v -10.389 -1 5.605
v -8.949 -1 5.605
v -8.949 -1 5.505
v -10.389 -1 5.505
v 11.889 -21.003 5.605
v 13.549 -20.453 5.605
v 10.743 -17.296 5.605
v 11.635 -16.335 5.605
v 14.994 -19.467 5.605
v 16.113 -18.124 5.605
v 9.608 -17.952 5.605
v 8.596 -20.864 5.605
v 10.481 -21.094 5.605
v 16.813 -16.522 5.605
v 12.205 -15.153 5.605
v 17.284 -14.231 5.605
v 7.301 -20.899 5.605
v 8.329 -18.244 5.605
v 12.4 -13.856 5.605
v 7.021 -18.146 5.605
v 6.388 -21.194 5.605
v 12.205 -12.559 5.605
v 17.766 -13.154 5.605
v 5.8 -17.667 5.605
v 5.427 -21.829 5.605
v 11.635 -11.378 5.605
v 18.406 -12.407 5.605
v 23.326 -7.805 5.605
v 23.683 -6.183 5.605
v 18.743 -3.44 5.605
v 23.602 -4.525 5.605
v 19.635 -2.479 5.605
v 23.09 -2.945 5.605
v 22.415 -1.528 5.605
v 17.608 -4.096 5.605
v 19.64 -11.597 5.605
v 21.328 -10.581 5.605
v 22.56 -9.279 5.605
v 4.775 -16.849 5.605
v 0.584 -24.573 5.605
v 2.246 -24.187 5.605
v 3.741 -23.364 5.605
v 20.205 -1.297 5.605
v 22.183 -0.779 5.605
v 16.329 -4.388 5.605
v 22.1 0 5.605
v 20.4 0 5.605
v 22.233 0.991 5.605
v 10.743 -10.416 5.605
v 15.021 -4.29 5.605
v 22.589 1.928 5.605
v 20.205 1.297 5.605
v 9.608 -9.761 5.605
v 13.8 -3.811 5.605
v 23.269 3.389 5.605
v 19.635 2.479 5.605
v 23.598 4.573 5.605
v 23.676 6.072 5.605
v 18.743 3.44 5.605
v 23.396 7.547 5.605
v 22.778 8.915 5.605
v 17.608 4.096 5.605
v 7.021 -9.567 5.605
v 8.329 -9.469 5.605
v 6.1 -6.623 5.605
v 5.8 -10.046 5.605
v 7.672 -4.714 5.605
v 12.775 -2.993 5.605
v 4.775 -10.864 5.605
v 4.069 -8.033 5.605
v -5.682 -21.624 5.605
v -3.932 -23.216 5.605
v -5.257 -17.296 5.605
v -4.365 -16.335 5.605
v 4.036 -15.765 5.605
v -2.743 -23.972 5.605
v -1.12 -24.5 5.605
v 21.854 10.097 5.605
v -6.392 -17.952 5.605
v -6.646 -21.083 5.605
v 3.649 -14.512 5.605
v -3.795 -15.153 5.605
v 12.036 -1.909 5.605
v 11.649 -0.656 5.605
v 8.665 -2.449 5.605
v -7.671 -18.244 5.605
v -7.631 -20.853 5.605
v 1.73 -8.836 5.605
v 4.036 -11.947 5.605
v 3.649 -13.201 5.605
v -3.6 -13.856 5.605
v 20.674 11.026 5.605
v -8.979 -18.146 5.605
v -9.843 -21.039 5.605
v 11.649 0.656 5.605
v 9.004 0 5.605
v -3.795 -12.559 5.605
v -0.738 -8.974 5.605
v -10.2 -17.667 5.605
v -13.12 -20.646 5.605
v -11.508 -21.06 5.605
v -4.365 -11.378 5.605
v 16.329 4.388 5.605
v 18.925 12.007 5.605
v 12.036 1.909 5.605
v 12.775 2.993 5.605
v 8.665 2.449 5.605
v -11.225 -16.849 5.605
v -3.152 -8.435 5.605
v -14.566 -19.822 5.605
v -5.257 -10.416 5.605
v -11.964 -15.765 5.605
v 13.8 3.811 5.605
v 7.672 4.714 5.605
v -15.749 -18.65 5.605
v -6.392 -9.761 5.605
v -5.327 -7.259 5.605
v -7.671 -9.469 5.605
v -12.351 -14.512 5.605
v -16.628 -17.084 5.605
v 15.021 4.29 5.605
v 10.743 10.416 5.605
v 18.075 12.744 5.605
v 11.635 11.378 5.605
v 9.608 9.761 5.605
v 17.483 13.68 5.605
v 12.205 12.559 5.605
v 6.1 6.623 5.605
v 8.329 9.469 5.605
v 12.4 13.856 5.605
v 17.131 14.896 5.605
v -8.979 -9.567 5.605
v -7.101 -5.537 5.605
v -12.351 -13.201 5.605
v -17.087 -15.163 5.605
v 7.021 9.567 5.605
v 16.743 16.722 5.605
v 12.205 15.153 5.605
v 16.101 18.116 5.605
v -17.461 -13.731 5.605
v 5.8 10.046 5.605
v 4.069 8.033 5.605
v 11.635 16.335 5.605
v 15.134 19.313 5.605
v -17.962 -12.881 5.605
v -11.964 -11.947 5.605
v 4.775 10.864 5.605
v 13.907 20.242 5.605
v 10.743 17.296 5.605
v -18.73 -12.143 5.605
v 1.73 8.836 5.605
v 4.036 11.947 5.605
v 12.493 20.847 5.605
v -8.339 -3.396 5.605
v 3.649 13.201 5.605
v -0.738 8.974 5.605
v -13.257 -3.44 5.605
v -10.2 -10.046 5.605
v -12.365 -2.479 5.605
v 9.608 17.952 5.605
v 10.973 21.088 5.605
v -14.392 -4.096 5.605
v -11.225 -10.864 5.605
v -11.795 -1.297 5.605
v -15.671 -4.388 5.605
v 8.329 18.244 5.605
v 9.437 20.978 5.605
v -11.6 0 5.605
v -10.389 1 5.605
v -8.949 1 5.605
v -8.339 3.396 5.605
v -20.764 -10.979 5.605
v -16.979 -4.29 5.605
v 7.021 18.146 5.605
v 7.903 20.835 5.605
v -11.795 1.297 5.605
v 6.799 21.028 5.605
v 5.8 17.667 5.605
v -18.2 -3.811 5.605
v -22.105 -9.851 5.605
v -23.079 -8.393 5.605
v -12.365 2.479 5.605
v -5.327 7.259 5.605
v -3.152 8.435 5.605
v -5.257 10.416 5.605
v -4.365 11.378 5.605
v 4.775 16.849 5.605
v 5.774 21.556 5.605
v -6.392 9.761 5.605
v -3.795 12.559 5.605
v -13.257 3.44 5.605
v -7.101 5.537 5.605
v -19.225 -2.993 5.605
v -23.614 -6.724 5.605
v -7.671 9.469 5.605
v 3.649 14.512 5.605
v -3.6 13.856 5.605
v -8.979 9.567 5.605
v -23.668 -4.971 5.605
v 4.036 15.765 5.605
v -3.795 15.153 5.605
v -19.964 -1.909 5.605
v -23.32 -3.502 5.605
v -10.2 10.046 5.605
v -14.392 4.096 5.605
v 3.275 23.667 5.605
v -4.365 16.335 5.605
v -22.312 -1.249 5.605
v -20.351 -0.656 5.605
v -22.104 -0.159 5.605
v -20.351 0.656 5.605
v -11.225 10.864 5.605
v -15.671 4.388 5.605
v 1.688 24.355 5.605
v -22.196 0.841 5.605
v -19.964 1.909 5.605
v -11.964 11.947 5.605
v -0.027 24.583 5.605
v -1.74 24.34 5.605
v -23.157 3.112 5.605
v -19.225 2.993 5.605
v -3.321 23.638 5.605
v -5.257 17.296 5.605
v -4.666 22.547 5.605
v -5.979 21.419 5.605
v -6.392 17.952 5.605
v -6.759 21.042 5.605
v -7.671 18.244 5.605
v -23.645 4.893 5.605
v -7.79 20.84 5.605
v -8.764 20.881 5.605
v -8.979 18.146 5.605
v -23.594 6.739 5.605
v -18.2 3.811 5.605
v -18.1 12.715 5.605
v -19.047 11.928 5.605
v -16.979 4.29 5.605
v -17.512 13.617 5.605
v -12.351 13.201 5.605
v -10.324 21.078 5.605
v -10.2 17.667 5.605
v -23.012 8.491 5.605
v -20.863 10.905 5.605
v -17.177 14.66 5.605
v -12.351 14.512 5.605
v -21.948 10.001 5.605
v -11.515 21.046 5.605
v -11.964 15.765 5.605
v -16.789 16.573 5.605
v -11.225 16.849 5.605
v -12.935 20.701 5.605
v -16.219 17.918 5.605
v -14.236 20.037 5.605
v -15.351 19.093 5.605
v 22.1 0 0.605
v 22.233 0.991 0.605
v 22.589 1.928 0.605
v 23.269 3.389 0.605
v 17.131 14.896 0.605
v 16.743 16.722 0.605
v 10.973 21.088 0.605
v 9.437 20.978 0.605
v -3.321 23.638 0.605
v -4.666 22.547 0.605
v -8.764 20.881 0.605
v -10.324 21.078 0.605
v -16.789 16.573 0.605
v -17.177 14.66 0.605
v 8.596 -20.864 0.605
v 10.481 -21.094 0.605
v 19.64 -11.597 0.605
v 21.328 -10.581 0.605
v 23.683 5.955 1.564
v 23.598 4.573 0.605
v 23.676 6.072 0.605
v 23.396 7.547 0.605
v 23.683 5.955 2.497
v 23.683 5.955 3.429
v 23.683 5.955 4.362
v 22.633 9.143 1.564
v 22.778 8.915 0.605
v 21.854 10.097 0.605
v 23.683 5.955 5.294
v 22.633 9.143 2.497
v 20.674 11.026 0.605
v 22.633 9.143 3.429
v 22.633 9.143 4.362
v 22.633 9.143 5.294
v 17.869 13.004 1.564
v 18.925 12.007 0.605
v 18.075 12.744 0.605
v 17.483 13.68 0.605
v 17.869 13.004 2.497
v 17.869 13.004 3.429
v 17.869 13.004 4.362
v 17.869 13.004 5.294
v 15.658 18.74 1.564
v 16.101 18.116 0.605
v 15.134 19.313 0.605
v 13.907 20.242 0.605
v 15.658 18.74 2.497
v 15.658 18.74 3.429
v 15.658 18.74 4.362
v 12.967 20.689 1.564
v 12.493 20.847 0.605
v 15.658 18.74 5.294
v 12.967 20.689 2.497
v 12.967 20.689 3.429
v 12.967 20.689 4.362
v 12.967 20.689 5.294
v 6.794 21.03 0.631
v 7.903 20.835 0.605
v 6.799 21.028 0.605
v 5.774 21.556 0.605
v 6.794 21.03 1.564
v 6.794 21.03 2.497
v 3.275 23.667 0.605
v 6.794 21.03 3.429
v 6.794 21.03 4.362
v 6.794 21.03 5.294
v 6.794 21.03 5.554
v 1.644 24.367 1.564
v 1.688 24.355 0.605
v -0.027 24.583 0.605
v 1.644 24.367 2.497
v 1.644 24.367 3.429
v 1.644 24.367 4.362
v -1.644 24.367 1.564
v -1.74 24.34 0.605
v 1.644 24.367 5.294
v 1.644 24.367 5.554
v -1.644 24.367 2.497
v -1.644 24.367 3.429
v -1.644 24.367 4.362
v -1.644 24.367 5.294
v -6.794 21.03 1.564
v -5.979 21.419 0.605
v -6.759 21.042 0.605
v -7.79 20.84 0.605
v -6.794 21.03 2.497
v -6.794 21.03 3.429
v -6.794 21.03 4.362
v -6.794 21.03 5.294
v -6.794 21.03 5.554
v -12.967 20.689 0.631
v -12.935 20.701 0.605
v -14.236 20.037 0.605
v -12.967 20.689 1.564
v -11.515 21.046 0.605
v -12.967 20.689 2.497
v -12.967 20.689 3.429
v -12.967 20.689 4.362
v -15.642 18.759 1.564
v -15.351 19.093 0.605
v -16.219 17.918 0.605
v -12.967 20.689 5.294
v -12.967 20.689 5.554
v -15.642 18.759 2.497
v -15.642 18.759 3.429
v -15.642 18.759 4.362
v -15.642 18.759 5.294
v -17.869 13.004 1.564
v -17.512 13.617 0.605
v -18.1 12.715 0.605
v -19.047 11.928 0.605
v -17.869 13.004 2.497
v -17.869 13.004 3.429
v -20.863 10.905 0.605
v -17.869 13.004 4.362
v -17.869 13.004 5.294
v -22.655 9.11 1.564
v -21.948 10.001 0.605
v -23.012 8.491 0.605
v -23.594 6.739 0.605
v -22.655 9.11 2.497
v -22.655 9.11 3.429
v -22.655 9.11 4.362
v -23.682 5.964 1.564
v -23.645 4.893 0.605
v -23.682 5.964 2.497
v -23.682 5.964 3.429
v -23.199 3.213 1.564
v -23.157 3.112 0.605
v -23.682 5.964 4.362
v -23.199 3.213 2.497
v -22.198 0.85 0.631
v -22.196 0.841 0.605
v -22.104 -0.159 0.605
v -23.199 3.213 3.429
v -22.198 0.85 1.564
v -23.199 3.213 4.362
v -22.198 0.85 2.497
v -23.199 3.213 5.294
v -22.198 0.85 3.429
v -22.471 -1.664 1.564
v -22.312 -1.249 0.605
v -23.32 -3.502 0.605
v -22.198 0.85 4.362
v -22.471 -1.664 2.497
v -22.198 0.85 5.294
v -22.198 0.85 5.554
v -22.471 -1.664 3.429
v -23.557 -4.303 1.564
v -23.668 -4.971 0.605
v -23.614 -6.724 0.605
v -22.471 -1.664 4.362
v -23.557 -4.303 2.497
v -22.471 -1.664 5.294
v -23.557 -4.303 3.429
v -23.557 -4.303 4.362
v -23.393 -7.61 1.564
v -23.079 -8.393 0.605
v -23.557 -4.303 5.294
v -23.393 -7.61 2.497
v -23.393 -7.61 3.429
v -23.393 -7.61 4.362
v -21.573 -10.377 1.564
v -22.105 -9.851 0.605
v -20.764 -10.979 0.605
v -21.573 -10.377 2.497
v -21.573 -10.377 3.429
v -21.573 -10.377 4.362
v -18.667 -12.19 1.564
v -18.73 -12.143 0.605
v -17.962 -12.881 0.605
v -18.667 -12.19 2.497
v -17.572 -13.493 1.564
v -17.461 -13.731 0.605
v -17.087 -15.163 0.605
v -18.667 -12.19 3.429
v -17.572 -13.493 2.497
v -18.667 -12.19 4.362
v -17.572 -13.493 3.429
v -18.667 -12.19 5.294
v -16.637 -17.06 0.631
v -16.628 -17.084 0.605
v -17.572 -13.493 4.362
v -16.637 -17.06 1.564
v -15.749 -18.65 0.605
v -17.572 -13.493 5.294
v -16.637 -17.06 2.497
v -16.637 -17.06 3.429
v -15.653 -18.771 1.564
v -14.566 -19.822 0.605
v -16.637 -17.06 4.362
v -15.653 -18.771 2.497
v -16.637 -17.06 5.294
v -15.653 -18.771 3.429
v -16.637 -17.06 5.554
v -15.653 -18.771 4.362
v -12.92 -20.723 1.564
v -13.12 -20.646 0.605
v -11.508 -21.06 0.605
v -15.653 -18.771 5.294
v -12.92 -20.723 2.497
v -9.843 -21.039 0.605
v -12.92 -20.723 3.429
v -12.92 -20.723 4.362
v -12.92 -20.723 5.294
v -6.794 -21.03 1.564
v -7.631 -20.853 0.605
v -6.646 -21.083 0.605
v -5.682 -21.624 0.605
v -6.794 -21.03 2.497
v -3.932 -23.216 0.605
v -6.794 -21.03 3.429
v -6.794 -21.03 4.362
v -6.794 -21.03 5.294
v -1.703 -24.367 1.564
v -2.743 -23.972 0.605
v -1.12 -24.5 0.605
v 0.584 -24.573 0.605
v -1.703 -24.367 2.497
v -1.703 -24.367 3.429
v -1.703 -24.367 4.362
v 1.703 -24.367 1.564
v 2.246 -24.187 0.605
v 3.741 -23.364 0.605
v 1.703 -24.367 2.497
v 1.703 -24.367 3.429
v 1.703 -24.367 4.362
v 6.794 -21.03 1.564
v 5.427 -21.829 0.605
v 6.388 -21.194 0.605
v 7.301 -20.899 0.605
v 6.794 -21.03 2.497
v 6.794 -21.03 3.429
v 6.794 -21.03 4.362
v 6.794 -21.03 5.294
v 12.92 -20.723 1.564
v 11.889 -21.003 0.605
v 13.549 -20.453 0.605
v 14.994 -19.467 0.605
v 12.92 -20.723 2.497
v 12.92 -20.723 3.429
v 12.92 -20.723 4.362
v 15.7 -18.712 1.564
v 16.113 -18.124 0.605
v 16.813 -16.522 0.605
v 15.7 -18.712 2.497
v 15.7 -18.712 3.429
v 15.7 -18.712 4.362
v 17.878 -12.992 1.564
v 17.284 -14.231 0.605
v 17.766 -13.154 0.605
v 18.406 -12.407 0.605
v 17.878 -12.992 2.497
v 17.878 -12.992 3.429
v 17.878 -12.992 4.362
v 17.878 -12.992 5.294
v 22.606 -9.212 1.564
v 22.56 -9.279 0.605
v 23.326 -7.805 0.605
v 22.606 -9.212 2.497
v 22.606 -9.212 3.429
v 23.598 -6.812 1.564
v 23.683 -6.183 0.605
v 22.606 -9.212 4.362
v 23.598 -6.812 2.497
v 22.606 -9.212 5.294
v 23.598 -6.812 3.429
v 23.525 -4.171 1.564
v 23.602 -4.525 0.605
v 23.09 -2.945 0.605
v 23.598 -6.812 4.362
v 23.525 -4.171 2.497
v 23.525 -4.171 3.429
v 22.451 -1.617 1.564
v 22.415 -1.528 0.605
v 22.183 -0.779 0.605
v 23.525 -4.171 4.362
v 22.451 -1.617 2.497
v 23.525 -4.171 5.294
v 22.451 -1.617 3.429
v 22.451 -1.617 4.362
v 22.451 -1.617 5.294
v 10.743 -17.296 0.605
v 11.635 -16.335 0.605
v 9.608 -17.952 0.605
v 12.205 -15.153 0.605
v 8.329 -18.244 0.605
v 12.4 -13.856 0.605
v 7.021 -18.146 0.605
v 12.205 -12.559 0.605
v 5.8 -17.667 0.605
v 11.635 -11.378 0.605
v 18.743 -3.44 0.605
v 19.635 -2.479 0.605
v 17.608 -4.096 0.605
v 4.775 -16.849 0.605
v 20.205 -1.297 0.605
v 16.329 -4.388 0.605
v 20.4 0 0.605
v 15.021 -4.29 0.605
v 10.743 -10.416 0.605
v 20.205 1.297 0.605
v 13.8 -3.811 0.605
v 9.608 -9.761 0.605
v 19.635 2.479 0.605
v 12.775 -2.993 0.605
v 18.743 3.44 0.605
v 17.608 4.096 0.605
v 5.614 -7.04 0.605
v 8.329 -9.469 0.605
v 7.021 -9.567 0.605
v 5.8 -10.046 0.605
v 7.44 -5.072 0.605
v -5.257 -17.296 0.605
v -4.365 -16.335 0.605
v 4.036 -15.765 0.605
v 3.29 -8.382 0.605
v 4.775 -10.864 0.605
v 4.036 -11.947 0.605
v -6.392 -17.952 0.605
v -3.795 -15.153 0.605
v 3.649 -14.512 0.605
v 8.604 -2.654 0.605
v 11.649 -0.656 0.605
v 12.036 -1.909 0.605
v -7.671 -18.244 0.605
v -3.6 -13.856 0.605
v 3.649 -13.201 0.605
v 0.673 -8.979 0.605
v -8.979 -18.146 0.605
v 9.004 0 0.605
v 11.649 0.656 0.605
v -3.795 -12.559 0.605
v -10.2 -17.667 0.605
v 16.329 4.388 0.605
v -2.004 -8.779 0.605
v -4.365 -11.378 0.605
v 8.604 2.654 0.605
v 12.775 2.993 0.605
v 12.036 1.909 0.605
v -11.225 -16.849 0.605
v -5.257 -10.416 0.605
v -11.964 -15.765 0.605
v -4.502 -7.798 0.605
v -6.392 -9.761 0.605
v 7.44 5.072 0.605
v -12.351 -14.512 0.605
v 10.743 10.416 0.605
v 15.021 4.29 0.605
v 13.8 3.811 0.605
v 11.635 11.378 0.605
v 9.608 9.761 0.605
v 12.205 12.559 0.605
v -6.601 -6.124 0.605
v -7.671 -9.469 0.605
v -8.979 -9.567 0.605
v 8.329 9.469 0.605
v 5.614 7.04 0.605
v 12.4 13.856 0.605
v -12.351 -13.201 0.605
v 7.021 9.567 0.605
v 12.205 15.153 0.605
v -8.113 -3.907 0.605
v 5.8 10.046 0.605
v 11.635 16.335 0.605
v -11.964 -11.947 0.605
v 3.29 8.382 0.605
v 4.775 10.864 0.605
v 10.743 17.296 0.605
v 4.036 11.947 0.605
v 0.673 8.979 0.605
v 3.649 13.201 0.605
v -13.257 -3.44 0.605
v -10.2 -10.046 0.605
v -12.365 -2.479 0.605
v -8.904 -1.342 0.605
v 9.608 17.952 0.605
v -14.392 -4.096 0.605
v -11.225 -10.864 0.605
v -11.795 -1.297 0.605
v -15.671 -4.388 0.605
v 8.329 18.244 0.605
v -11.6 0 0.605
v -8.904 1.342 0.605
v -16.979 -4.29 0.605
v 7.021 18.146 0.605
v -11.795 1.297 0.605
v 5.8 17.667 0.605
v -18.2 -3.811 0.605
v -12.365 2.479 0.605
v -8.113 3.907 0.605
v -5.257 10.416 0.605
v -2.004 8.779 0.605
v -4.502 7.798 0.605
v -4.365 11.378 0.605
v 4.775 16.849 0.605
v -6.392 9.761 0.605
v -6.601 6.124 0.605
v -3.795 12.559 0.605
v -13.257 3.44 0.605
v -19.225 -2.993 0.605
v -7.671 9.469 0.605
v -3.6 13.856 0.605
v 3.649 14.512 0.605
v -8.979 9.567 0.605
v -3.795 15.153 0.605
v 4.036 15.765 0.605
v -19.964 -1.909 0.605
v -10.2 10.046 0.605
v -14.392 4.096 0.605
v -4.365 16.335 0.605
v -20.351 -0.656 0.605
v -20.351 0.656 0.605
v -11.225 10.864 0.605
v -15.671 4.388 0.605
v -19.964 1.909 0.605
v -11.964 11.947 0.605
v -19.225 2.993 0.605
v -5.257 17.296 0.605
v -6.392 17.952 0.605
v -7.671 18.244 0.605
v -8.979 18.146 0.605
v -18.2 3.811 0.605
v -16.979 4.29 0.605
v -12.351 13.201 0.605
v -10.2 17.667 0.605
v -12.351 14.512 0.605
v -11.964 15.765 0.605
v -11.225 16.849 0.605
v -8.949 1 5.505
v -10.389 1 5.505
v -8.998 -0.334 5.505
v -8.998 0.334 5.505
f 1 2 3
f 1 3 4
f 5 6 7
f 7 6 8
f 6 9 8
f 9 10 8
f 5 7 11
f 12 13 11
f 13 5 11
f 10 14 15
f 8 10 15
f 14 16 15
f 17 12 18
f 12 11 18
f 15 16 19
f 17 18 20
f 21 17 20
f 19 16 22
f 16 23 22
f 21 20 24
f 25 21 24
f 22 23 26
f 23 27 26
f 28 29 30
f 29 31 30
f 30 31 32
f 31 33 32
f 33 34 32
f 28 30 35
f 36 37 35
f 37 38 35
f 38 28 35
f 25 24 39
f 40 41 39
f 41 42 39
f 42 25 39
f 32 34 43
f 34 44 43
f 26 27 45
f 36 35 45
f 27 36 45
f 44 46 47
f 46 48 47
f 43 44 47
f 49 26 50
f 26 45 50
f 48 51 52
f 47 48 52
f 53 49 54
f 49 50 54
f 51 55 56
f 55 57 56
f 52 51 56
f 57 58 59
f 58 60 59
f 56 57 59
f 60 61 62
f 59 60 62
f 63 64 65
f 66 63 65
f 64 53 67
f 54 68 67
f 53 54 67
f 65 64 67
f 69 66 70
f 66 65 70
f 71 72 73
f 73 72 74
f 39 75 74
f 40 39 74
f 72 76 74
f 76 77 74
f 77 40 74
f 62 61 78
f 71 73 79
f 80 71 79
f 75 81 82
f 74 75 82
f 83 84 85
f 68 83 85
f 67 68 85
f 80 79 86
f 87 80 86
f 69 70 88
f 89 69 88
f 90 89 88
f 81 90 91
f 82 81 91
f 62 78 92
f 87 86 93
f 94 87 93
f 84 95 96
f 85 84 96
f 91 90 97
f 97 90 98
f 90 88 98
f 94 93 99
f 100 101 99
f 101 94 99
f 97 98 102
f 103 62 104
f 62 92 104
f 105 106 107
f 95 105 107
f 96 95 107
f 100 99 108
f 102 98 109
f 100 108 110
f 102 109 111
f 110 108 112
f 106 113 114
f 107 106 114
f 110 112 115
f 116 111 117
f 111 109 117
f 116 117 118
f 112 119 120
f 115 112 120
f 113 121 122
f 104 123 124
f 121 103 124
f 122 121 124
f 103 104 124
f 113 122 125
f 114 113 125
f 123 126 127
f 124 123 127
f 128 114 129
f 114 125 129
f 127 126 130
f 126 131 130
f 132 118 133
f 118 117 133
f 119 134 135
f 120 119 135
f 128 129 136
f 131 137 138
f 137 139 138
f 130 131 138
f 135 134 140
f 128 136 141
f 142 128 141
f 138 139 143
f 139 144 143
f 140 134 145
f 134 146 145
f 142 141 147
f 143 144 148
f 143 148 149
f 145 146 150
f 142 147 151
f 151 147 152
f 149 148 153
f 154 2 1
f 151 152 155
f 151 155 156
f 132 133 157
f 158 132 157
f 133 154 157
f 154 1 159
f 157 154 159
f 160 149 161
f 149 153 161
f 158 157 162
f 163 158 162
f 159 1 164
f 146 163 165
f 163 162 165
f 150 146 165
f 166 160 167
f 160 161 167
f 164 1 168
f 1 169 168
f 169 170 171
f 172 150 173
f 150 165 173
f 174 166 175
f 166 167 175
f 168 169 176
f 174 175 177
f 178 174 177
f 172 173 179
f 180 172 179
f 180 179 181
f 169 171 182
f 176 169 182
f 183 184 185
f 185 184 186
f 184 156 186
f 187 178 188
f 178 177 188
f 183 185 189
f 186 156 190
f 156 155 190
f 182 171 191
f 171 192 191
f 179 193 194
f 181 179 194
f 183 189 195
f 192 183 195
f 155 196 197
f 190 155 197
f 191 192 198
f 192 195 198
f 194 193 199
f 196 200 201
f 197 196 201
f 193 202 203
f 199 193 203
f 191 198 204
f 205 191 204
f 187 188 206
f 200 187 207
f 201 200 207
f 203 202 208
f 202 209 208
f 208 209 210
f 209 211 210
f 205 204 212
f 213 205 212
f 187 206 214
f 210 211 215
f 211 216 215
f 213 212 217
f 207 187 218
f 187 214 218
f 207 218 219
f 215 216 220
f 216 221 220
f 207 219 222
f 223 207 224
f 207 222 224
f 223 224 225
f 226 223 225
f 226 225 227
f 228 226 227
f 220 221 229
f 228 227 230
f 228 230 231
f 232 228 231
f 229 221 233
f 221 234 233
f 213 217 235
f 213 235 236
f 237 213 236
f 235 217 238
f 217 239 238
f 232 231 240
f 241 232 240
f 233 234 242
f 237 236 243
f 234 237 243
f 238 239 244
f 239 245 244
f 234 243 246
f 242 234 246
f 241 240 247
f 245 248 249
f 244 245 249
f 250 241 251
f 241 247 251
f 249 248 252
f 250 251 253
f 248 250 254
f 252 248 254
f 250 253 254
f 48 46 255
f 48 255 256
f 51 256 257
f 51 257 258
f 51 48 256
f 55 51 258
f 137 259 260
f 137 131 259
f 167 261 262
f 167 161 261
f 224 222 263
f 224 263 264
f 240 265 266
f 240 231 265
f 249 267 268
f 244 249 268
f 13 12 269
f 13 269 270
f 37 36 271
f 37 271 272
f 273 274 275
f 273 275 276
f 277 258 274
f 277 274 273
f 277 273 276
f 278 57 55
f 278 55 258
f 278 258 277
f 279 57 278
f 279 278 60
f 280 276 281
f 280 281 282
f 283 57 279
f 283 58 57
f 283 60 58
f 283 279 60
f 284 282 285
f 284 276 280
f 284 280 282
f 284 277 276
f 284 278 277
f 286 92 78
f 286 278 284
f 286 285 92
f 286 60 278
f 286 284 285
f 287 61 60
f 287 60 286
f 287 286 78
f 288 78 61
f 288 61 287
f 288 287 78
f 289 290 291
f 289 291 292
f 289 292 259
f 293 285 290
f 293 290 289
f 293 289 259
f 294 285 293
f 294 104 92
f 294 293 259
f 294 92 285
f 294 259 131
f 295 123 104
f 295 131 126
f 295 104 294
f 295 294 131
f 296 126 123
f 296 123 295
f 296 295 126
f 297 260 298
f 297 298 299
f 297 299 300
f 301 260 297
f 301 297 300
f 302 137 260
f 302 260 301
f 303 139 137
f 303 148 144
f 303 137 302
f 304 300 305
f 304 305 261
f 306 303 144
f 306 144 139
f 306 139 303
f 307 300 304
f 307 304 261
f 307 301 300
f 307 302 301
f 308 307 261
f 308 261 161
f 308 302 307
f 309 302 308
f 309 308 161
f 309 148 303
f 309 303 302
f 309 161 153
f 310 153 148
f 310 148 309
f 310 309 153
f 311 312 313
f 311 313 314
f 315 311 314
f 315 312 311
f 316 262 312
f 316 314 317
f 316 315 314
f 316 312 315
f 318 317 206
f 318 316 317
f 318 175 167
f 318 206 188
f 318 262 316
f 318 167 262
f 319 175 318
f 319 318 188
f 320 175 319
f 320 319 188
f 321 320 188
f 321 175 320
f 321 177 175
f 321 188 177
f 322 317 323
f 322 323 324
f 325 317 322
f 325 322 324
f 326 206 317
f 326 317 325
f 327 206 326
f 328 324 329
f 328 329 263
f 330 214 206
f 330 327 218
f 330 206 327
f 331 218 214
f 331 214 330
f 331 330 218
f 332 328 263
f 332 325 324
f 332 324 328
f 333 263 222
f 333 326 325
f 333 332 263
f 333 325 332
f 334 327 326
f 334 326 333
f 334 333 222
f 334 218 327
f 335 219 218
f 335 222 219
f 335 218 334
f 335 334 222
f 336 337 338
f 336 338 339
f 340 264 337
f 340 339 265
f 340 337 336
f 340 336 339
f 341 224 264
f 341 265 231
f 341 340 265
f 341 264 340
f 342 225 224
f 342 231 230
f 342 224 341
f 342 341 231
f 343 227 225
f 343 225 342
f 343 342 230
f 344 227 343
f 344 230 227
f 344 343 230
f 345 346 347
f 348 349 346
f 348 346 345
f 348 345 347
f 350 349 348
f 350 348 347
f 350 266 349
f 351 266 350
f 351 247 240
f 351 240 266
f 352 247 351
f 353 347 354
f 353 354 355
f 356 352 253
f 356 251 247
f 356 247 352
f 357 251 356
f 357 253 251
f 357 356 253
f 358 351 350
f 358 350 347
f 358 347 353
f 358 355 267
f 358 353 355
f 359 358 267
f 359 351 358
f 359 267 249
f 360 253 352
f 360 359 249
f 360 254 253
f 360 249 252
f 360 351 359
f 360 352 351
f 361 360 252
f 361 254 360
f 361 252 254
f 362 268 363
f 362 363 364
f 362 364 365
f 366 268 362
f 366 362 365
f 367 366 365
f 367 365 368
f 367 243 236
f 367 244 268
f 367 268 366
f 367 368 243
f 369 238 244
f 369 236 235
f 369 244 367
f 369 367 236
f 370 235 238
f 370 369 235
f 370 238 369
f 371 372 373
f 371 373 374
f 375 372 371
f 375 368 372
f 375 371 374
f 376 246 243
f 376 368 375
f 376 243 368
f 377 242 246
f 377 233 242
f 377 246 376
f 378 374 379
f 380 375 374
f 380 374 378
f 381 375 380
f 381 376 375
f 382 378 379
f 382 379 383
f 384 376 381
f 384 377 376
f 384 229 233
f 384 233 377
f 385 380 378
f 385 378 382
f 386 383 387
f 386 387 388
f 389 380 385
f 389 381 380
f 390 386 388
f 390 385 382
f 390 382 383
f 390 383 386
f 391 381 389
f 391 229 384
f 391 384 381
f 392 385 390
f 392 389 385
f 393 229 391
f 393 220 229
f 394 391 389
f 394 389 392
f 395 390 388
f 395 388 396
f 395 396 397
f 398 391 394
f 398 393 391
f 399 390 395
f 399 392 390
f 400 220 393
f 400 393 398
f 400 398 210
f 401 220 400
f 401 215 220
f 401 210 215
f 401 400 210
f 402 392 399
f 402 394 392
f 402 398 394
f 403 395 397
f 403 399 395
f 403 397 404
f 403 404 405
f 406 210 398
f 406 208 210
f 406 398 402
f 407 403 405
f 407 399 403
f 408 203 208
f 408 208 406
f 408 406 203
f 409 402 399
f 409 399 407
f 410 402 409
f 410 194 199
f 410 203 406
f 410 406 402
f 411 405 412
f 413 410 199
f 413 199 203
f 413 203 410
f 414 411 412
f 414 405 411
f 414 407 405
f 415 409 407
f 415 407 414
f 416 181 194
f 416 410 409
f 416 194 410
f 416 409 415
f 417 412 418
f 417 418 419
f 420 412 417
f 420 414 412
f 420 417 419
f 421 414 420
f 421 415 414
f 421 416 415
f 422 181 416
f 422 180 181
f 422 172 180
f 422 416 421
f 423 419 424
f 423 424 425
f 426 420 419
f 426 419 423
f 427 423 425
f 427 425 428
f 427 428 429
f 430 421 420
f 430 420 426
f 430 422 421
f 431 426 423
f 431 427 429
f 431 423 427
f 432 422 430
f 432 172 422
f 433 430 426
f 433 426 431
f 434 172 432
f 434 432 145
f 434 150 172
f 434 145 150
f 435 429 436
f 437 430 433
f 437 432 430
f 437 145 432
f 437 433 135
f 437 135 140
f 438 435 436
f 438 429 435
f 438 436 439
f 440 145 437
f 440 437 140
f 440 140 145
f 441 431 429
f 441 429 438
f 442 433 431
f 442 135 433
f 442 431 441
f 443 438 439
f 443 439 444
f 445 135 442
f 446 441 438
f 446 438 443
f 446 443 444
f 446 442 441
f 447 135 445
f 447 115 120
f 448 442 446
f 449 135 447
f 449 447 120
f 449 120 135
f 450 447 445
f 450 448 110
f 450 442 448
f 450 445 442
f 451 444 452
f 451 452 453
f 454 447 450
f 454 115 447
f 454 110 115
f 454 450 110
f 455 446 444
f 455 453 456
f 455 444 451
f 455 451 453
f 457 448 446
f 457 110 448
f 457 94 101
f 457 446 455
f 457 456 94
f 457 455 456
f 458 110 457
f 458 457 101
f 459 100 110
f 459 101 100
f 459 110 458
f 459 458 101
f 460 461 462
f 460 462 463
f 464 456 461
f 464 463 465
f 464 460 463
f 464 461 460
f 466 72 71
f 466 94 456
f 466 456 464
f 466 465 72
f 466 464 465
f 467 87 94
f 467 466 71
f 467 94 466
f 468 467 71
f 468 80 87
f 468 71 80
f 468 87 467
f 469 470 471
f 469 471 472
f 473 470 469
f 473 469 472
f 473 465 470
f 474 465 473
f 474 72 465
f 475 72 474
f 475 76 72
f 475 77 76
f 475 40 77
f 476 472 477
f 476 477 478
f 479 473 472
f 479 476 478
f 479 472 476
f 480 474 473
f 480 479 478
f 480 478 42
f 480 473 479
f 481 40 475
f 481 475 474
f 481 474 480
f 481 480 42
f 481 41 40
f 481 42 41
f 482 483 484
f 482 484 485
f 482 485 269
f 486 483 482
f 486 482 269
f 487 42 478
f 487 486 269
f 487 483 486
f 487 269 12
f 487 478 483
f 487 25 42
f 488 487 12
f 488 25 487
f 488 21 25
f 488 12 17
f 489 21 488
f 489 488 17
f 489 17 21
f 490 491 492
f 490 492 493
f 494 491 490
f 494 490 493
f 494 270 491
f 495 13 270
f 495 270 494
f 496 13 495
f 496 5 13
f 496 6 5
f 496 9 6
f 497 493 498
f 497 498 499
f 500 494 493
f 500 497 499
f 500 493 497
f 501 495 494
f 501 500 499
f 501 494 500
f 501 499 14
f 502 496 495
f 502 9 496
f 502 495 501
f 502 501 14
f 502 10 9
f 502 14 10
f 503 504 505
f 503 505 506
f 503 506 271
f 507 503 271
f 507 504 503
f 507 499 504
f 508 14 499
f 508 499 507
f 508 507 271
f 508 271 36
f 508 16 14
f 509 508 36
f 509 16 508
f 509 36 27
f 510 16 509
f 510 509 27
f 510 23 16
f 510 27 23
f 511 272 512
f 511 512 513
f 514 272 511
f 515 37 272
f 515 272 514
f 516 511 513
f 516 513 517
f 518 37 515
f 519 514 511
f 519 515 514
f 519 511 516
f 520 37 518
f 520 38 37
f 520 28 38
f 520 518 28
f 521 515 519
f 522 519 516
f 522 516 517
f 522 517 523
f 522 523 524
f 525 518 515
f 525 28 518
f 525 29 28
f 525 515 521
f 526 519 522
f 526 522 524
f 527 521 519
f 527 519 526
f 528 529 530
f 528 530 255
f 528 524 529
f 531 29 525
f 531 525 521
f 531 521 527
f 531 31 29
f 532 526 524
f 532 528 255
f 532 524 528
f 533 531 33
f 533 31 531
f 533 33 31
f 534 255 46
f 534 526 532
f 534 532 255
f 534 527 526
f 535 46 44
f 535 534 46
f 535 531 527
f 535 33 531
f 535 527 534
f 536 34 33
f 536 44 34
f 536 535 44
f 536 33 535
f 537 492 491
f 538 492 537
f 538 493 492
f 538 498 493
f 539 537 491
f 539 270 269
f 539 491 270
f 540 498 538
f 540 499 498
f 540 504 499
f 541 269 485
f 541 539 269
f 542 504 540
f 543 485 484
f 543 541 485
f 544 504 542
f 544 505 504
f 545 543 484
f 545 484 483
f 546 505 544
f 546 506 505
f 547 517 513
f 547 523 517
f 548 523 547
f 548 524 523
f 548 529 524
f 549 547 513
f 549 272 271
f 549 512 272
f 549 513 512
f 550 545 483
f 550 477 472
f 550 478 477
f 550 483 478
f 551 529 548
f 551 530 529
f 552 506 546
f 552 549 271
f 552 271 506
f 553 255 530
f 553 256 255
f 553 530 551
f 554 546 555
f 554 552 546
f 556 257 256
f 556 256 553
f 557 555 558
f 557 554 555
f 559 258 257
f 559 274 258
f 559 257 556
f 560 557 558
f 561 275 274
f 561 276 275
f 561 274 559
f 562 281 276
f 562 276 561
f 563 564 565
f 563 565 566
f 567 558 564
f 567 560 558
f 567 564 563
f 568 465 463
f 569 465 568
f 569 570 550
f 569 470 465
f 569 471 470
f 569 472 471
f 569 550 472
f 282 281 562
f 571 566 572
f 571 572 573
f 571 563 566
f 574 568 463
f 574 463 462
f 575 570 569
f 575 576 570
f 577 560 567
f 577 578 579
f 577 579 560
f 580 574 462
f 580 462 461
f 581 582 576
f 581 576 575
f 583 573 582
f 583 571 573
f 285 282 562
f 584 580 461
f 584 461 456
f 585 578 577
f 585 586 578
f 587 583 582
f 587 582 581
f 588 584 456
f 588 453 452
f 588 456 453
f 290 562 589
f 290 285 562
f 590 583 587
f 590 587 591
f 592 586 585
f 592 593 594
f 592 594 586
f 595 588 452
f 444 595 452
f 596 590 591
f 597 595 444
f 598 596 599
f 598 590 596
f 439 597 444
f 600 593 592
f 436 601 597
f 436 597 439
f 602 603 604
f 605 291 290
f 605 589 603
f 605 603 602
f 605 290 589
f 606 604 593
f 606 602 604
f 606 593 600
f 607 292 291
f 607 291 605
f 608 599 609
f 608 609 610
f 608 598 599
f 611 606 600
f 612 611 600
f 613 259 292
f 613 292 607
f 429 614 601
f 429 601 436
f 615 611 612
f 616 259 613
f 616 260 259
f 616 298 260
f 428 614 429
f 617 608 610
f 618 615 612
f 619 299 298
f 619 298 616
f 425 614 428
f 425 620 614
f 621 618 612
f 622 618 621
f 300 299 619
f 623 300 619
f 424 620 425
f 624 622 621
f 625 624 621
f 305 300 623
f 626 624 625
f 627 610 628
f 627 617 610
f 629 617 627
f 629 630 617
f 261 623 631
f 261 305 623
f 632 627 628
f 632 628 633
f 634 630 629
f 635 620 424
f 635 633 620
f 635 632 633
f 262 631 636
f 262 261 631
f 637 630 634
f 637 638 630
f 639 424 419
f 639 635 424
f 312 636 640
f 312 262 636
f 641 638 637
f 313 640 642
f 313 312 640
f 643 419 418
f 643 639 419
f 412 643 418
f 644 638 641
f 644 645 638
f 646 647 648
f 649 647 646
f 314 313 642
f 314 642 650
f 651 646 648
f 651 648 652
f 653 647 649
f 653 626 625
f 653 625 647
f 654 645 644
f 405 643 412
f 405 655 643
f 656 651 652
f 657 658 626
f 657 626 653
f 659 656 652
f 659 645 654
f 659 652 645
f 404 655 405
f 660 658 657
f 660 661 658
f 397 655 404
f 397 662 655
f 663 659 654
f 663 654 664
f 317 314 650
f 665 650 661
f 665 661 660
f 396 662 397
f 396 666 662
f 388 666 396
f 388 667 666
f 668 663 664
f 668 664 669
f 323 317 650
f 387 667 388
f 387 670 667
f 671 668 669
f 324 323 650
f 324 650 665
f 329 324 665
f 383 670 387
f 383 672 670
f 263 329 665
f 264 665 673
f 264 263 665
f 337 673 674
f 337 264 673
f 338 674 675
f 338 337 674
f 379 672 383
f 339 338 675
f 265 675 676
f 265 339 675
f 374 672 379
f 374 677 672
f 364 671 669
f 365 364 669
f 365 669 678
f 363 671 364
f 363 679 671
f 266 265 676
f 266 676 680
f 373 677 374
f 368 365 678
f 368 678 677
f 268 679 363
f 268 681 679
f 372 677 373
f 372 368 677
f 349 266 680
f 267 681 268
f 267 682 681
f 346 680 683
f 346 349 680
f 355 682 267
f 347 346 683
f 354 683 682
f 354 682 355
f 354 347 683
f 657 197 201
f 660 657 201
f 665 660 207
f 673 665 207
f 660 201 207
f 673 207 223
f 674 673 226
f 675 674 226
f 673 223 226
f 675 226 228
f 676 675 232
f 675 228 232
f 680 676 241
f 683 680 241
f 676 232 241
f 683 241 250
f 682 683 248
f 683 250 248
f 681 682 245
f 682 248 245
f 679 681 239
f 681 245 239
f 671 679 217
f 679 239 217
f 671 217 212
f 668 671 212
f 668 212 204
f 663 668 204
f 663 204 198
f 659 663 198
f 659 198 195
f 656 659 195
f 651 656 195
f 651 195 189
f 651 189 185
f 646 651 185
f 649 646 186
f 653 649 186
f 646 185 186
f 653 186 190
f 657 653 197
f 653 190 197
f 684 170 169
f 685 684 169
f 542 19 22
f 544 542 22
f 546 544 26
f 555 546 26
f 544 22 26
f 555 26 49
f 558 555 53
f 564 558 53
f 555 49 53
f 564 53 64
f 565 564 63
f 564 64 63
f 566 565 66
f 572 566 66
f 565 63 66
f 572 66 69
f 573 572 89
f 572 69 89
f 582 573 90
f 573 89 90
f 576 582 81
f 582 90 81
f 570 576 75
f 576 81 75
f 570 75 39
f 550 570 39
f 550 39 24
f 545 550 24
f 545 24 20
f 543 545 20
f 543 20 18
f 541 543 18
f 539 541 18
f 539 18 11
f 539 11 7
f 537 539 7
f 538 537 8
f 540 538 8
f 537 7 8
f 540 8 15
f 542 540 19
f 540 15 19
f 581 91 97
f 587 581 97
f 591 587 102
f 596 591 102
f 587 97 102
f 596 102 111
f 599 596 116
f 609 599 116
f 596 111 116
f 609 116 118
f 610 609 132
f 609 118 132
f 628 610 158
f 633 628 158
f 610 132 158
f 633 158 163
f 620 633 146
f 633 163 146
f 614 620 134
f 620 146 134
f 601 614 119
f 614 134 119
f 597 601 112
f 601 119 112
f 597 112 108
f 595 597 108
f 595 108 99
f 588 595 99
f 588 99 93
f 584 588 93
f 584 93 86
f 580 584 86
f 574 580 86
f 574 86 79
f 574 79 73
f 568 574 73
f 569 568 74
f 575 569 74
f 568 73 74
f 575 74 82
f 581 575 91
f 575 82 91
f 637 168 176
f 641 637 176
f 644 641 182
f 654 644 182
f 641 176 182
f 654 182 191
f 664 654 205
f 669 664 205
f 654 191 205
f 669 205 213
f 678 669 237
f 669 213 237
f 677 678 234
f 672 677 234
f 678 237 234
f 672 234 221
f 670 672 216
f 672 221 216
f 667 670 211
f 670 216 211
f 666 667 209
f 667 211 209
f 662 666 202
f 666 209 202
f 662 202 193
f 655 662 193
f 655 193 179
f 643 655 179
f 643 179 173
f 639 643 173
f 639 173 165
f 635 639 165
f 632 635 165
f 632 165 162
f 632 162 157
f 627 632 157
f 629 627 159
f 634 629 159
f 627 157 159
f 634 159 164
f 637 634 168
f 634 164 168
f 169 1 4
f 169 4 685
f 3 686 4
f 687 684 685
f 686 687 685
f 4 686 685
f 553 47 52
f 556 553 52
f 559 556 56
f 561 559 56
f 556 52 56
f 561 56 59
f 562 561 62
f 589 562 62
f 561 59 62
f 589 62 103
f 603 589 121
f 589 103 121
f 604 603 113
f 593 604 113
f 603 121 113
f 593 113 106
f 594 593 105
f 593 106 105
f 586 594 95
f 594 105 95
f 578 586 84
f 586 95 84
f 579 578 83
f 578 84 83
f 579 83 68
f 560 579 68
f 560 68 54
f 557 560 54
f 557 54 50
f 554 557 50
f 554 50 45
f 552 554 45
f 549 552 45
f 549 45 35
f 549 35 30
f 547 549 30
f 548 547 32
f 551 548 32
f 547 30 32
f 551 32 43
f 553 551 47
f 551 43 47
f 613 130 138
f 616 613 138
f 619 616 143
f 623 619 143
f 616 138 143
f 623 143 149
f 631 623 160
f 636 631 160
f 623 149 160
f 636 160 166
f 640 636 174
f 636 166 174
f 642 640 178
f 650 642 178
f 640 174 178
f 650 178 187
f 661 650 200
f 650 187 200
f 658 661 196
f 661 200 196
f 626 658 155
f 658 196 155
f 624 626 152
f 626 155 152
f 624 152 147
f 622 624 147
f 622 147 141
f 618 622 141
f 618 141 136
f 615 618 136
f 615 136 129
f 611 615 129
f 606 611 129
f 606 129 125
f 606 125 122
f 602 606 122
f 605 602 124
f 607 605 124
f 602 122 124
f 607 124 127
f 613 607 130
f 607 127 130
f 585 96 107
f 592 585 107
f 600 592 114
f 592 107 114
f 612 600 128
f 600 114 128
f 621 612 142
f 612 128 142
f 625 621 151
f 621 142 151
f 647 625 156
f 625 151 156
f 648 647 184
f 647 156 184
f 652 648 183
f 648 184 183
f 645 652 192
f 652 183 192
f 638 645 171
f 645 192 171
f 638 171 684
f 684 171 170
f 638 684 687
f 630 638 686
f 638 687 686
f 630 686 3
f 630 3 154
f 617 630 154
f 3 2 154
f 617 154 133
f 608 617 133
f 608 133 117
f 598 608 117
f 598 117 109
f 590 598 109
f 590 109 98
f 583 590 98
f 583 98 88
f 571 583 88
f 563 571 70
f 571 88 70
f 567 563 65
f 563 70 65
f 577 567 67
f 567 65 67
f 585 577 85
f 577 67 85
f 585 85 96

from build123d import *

# Parameters (mm, degrees)
SKETCH2_R           = 9.0043
SKETCH2_R_2         = 4.4
BOSS_EXTRUDE1_DEPTH = 5
CUT_EXTRUDE1_DEPTH  = 0.1


with BuildPart() as part:
    # Sketch2 → Boss-Extrude1 (new body)
    with BuildSketch(Plane.XY.offset(5.605325797)):
        with BuildLine():
            add(Edge.make_bspline(
                [(22.1, 0), (22.1, -0.029302567), (22.100656996, -0.073267299), (22.102846978, -0.150479345), (22.107765032, -0.243024679), (22.113002169, -0.31356521), (22.121167512, -0.399042775), (22.137660505, -0.535547313), (22.168477812, -0.725309174), (22.221962498, -0.961733919), (22.301132136, -1.228529968), (22.396248759, -1.489311546), (22.504572502, -1.745256299), (22.622714563, -1.996489409), (22.746713886, -2.245018567), (22.87241041, -2.492573124), (22.995858066, -2.741341347), (23.143387346, -3.055544856), (23.304631036, -3.439826563), (23.489677504, -3.978553819), (23.651034334, -4.683442393), (23.730085815, -5.486733771), (23.690072978, -6.376338564), (23.526656928, -7.245430382), (23.246859664, -8.078377589), (22.858354421, -8.859291128), (22.36991344, -9.575757168), (21.746771046, -10.259536929), (20.979757182, -10.880170438), (20.07185269, -11.393514988), (19.074956387, -11.857034761), (18.181387307, -12.525379462), (17.522574849, -13.435236027), (17.165903162, -14.499100143), (17.035166981, -15.602135191), (16.773131617, -16.850230243), (16.183180557, -18.169843003), (15.185324779, -19.426415814), (13.758890787, -20.45679901), (12.257817896, -21.009294245), (10.828993799, -21.15920723), (9.560643085, -21.020485338), (8.461027709, -20.802084394), (7.328375606, -20.821045963), (6.253101017, -21.181361325), (5.341855753, -21.842454293), (4.590177093, -22.657661818), (3.646274458, -23.503590974), (2.404327803, -24.212967426), (0.872596385, -24.63896937), (-0.872596249, -24.638969598), (-2.404328196, -24.212967156), (-3.646273705, -23.503591358), (-4.590178654, -22.657661122), (-5.341852785, -21.84245556), (-6.253105576, -21.1813594), (-7.328368243, -20.821049059), (-8.46104013, -20.80207918), (-9.560620352, -21.020494874), (-10.829032369, -21.159191057), (-12.257759872, -21.009318559), (-13.741024473, -20.463370436), (-15.139383208, -19.4615155), (-16.041258918, -18.353410382), (-16.553530054, -17.344966352), (-16.819283882, -16.538402702), (-16.951869323, -15.981061926), (-17.071894903, -15.275534032), (-17.175369193, -14.567994024), (-17.371218875, -13.874397941), (-17.759814305, -13.10553406), (-18.30130832, -12.427799863), (-19.120124546, -11.828042716), (-20.161840701, -11.354111243), (-21.266581229, -10.70199441), (-22.310551276, -9.733982335), (-23.165156921, -8.427533899), (-23.625552587, -7.017417615), (-23.746197848, -5.757684391), (-23.663442889, -4.777094196), (-23.518570066, -4.085486246), (-23.321955401, -3.476877841), (-23.100306653, -2.948620034), (-22.84529241, -2.436105267), (-22.615965168, -1.990999888), (-22.408917504, -1.534577596), (-22.277167112, -1.163364664), (-22.202479171, -0.886606409), (-22.154838808, -0.640885487), (-22.13560223, -0.516552839), (-22.122473754, -0.410978079), (-22.113805721, -0.322921864), (-22.10824541, -0.250610924), (-22.104067745, -0.17471333), (-22.1012791, -0.097385476), (-22.100232564, -0.045489039), (-22.1, -0.015098244), (-22.1, 0)],
                knots=[0.07789061, 0.07789061, 0.07789061, 0.07789061, 0.07789061, 0.079370354, 0.080110226, 0.080850098, 0.08158997, 0.082329842, 0.083809586, 0.086769074, 0.089728562, 0.09268805, 0.095647538, 0.098607026, 0.101566514, 0.104526002, 0.10748549, 0.110444978, 0.113404466, 0.119323442, 0.125242418, 0.134700775, 0.144159132, 0.15361749, 0.163075847, 0.172283742, 0.181491636, 0.190699531, 0.199907426, 0.211620029, 0.223332633, 0.235045236, 0.24675784, 0.258595752, 0.270433664, 0.282271576, 0.294109487, 0.312775713, 0.331441938, 0.349816075, 0.368190212, 0.380135666, 0.392081119, 0.404026572, 0.415972026, 0.427791948, 0.43961187, 0.451431791, 0.463251713, 0.481625819, 0.499999926, 0.518374032, 0.536748138, 0.54856806, 0.560387982, 0.572207904, 0.584027825, 0.595973279, 0.607918732, 0.619864186, 0.631809639, 0.650183776, 0.668557913, 0.68641831, 0.704278706, 0.710378253, 0.716477801, 0.722577348, 0.728676896, 0.740875991, 0.746975538, 0.753075086, 0.765274168, 0.77747325, 0.789672332, 0.801871414, 0.819731822, 0.83759223, 0.855452636, 0.864382839, 0.873313042, 0.879412586, 0.885512129, 0.891611673, 0.897711216, 0.903810759, 0.906860531, 0.912960075, 0.91448496, 0.916009846, 0.917534732, 0.918297175, 0.919059618, 0.919822061, 0.920584504, 0.921346947, 0.92210939, 0.92210939, 0.92210939, 0.92210939, 0.92210939], degree=4))
            add(Edge.make_bspline(
                [(22.1, 0), (22.1, 0.014913522), (22.100226653, 0.044933173), (22.10124659, 0.096082665), (22.103964371, 0.172403639), (22.1080359, 0.247492105), (22.113454992, 0.319065267), (22.121902979, 0.406124587), (22.134698422, 0.510371309), (22.153447855, 0.633233839), (22.179982074, 0.772060815), (22.211452218, 0.909853003), (22.247651008, 1.046536238), (22.288329804, 1.181935635), (22.344427346, 1.349509412), (22.419456754, 1.547897543), (22.516663816, 1.77543969), (22.667370853, 2.095152506), (22.858985392, 2.473433664), (23.078460642, 2.916931322), (23.297969399, 3.438594817), (23.496579982, 4.046049559), (23.64564957, 4.743090599), (23.714142725, 5.526673223), (23.670851556, 6.385255045), (23.512632324, 7.226073234), (23.245004777, 8.034719064), (22.874344583, 8.796894529), (22.407796336, 9.500388465), (21.802810765, 10.188284793), (21.043808682, 10.825622856), (20.128343518, 11.363955359), (19.101585771, 11.838846865), (18.181239937, 12.520028998), (17.50891279, 13.454995968), (17.155819834, 14.543847375), (17.02328672, 15.666811584), (16.740047931, 16.912966571), (16.138001231, 18.207755715), (15.152648058, 19.425448044), (13.945498817, 20.298310592), (12.783576336, 20.798139903), (11.690887772, 21.051994172), (10.698758715, 21.128491931), (9.629805955, 21.030482528), (8.50287965, 20.804890253), (7.342467075, 20.814718589), (6.238109955, 21.184768886), (5.31001074, 21.869680724), (4.539808437, 22.705915037), (3.576098101, 23.539359516), (2.337850697, 24.219609627), (0.840864936, 24.619297162), (-0.840864954, 24.619297154), (-2.337850638, 24.219609637), (-3.576098219, 23.539359501), (-4.539808186, 22.705915064), (-5.310011212, 21.869680677), (-6.238109236, 21.184768958), (-7.342468241, 20.814718473), (-8.502877632, 20.804890453), (-9.629809926, 21.030482133), (-10.698752375, 21.128492562), (-11.690895606, 21.051993386), (-12.783563324, 20.798141241), (-13.939824249, 20.30075947), (-15.137709214, 19.436881183), (-16.121598679, 18.230667487), (-16.728655439, 16.945369314), (-17.019832961, 15.697447108), (-17.151654869, 14.561988282), (-17.504447964, 13.459997777), (-18.184591746, 12.514224003), (-19.117520125, 11.829007906), (-20.156413449, 11.351465046), (-21.256719581, 10.695581158), (-22.297277306, 9.726765243), (-23.149255071, 8.421124942), (-23.60910939, 7.012995514), (-23.730598606, 5.75499692), (-23.649636571, 4.775573938), (-23.506579637, 4.08451009), (-23.312164543, 3.476070063), (-23.120221717, 3.01371781), (-22.935057566, 2.627018443), (-22.774924406, 2.307695536), (-22.647373706, 2.051947916), (-22.509566084, 1.761427705), (-22.398099841, 1.498124207), (-22.313048098, 1.26278764), (-22.25078913, 1.057652616), (-22.213840712, 0.919575427), (-22.181707778, 0.780344568), (-22.154607389, 0.640086531), (-22.135453799, 0.515905115), (-22.122380878, 0.410461871), (-22.113749008, 0.322515453), (-22.108211682, 0.250292312), (-22.104051158, 0.174484331), (-22.101273896, 0.097249104), (-22.100231618, 0.045422996), (-22.1, 0.015075963), (-22.1, 0)],
                knots=[0.077977028, 0.077977028, 0.077977028, 0.077977028, 0.077977028, 0.078731103, 0.079485177, 0.080239252, 0.080993326, 0.0817474, 0.082501475, 0.084009624, 0.085517772, 0.087025921, 0.08853407, 0.090042219, 0.091550368, 0.093058516, 0.096074814, 0.099091112, 0.102107409, 0.108140005, 0.1141726, 0.120205195, 0.12623779, 0.135381073, 0.144524356, 0.153667639, 0.162810921, 0.171787395, 0.180763869, 0.189740343, 0.198716817, 0.21078185, 0.222846882, 0.234911915, 0.246976948, 0.259042056, 0.271107164, 0.283172272, 0.295237381, 0.313357051, 0.331476722, 0.349220208, 0.358091952, 0.366963695, 0.379220116, 0.391476537, 0.403732958, 0.415989379, 0.428120336, 0.440251292, 0.452382248, 0.464513204, 0.482256584, 0.499999964, 0.517743344, 0.535486724, 0.54761768, 0.559748636, 0.571879592, 0.584010548, 0.596266969, 0.60852339, 0.620779811, 0.633036233, 0.641907976, 0.650779719, 0.668523206, 0.686379934, 0.704236662, 0.716433282, 0.728629901, 0.740826521, 0.753023141, 0.765219739, 0.777416337, 0.789612935, 0.801809534, 0.819666292, 0.837523049, 0.855379796, 0.864308169, 0.873236542, 0.879334846, 0.885433149, 0.891531453, 0.894580605, 0.897629757, 0.900678909, 0.903728061, 0.908301788, 0.909826364, 0.91135094, 0.912875516, 0.914400092, 0.915924668, 0.917449244, 0.918211532, 0.91897382, 0.919736108, 0.920498396, 0.921260684, 0.922022972, 0.922022972, 0.922022972, 0.922022972, 0.922022972], degree=4))
        make_face()
        Circle(SKETCH2_R, mode=Mode.SUBTRACT)
        with Locations((8, 13.856406461)):
            Circle(SKETCH2_R_2, mode=Mode.SUBTRACT)
        with Locations((16, 0)):
            Circle(SKETCH2_R_2, mode=Mode.SUBTRACT)
        with Locations((8, -13.856406461)):
            Circle(SKETCH2_R_2, mode=Mode.SUBTRACT)
        with Locations((-8, -13.856406461)):
            Circle(SKETCH2_R_2, mode=Mode.SUBTRACT)
        with Locations((-16, 0)):
            Circle(SKETCH2_R_2, mode=Mode.SUBTRACT)
        with Locations((-8, 13.856406461)):
            Circle(SKETCH2_R_2, mode=Mode.SUBTRACT)
    extrude(amount=-BOSS_EXTRUDE1_DEPTH)

    # Sketch3 → Cut-Extrude1 (cut)
    with BuildSketch(Plane.XY.offset(5.605325797)):
        Polygon((-10.388759749, -1), (-10.388759749, 1), (-8.742920185, 1), (-8.663892273, 1), (-8.663892273, -1), align=None)
    extrude(amount=-CUT_EXTRUDE1_DEPTH, mode=Mode.SUBTRACT)


solid = part.part
